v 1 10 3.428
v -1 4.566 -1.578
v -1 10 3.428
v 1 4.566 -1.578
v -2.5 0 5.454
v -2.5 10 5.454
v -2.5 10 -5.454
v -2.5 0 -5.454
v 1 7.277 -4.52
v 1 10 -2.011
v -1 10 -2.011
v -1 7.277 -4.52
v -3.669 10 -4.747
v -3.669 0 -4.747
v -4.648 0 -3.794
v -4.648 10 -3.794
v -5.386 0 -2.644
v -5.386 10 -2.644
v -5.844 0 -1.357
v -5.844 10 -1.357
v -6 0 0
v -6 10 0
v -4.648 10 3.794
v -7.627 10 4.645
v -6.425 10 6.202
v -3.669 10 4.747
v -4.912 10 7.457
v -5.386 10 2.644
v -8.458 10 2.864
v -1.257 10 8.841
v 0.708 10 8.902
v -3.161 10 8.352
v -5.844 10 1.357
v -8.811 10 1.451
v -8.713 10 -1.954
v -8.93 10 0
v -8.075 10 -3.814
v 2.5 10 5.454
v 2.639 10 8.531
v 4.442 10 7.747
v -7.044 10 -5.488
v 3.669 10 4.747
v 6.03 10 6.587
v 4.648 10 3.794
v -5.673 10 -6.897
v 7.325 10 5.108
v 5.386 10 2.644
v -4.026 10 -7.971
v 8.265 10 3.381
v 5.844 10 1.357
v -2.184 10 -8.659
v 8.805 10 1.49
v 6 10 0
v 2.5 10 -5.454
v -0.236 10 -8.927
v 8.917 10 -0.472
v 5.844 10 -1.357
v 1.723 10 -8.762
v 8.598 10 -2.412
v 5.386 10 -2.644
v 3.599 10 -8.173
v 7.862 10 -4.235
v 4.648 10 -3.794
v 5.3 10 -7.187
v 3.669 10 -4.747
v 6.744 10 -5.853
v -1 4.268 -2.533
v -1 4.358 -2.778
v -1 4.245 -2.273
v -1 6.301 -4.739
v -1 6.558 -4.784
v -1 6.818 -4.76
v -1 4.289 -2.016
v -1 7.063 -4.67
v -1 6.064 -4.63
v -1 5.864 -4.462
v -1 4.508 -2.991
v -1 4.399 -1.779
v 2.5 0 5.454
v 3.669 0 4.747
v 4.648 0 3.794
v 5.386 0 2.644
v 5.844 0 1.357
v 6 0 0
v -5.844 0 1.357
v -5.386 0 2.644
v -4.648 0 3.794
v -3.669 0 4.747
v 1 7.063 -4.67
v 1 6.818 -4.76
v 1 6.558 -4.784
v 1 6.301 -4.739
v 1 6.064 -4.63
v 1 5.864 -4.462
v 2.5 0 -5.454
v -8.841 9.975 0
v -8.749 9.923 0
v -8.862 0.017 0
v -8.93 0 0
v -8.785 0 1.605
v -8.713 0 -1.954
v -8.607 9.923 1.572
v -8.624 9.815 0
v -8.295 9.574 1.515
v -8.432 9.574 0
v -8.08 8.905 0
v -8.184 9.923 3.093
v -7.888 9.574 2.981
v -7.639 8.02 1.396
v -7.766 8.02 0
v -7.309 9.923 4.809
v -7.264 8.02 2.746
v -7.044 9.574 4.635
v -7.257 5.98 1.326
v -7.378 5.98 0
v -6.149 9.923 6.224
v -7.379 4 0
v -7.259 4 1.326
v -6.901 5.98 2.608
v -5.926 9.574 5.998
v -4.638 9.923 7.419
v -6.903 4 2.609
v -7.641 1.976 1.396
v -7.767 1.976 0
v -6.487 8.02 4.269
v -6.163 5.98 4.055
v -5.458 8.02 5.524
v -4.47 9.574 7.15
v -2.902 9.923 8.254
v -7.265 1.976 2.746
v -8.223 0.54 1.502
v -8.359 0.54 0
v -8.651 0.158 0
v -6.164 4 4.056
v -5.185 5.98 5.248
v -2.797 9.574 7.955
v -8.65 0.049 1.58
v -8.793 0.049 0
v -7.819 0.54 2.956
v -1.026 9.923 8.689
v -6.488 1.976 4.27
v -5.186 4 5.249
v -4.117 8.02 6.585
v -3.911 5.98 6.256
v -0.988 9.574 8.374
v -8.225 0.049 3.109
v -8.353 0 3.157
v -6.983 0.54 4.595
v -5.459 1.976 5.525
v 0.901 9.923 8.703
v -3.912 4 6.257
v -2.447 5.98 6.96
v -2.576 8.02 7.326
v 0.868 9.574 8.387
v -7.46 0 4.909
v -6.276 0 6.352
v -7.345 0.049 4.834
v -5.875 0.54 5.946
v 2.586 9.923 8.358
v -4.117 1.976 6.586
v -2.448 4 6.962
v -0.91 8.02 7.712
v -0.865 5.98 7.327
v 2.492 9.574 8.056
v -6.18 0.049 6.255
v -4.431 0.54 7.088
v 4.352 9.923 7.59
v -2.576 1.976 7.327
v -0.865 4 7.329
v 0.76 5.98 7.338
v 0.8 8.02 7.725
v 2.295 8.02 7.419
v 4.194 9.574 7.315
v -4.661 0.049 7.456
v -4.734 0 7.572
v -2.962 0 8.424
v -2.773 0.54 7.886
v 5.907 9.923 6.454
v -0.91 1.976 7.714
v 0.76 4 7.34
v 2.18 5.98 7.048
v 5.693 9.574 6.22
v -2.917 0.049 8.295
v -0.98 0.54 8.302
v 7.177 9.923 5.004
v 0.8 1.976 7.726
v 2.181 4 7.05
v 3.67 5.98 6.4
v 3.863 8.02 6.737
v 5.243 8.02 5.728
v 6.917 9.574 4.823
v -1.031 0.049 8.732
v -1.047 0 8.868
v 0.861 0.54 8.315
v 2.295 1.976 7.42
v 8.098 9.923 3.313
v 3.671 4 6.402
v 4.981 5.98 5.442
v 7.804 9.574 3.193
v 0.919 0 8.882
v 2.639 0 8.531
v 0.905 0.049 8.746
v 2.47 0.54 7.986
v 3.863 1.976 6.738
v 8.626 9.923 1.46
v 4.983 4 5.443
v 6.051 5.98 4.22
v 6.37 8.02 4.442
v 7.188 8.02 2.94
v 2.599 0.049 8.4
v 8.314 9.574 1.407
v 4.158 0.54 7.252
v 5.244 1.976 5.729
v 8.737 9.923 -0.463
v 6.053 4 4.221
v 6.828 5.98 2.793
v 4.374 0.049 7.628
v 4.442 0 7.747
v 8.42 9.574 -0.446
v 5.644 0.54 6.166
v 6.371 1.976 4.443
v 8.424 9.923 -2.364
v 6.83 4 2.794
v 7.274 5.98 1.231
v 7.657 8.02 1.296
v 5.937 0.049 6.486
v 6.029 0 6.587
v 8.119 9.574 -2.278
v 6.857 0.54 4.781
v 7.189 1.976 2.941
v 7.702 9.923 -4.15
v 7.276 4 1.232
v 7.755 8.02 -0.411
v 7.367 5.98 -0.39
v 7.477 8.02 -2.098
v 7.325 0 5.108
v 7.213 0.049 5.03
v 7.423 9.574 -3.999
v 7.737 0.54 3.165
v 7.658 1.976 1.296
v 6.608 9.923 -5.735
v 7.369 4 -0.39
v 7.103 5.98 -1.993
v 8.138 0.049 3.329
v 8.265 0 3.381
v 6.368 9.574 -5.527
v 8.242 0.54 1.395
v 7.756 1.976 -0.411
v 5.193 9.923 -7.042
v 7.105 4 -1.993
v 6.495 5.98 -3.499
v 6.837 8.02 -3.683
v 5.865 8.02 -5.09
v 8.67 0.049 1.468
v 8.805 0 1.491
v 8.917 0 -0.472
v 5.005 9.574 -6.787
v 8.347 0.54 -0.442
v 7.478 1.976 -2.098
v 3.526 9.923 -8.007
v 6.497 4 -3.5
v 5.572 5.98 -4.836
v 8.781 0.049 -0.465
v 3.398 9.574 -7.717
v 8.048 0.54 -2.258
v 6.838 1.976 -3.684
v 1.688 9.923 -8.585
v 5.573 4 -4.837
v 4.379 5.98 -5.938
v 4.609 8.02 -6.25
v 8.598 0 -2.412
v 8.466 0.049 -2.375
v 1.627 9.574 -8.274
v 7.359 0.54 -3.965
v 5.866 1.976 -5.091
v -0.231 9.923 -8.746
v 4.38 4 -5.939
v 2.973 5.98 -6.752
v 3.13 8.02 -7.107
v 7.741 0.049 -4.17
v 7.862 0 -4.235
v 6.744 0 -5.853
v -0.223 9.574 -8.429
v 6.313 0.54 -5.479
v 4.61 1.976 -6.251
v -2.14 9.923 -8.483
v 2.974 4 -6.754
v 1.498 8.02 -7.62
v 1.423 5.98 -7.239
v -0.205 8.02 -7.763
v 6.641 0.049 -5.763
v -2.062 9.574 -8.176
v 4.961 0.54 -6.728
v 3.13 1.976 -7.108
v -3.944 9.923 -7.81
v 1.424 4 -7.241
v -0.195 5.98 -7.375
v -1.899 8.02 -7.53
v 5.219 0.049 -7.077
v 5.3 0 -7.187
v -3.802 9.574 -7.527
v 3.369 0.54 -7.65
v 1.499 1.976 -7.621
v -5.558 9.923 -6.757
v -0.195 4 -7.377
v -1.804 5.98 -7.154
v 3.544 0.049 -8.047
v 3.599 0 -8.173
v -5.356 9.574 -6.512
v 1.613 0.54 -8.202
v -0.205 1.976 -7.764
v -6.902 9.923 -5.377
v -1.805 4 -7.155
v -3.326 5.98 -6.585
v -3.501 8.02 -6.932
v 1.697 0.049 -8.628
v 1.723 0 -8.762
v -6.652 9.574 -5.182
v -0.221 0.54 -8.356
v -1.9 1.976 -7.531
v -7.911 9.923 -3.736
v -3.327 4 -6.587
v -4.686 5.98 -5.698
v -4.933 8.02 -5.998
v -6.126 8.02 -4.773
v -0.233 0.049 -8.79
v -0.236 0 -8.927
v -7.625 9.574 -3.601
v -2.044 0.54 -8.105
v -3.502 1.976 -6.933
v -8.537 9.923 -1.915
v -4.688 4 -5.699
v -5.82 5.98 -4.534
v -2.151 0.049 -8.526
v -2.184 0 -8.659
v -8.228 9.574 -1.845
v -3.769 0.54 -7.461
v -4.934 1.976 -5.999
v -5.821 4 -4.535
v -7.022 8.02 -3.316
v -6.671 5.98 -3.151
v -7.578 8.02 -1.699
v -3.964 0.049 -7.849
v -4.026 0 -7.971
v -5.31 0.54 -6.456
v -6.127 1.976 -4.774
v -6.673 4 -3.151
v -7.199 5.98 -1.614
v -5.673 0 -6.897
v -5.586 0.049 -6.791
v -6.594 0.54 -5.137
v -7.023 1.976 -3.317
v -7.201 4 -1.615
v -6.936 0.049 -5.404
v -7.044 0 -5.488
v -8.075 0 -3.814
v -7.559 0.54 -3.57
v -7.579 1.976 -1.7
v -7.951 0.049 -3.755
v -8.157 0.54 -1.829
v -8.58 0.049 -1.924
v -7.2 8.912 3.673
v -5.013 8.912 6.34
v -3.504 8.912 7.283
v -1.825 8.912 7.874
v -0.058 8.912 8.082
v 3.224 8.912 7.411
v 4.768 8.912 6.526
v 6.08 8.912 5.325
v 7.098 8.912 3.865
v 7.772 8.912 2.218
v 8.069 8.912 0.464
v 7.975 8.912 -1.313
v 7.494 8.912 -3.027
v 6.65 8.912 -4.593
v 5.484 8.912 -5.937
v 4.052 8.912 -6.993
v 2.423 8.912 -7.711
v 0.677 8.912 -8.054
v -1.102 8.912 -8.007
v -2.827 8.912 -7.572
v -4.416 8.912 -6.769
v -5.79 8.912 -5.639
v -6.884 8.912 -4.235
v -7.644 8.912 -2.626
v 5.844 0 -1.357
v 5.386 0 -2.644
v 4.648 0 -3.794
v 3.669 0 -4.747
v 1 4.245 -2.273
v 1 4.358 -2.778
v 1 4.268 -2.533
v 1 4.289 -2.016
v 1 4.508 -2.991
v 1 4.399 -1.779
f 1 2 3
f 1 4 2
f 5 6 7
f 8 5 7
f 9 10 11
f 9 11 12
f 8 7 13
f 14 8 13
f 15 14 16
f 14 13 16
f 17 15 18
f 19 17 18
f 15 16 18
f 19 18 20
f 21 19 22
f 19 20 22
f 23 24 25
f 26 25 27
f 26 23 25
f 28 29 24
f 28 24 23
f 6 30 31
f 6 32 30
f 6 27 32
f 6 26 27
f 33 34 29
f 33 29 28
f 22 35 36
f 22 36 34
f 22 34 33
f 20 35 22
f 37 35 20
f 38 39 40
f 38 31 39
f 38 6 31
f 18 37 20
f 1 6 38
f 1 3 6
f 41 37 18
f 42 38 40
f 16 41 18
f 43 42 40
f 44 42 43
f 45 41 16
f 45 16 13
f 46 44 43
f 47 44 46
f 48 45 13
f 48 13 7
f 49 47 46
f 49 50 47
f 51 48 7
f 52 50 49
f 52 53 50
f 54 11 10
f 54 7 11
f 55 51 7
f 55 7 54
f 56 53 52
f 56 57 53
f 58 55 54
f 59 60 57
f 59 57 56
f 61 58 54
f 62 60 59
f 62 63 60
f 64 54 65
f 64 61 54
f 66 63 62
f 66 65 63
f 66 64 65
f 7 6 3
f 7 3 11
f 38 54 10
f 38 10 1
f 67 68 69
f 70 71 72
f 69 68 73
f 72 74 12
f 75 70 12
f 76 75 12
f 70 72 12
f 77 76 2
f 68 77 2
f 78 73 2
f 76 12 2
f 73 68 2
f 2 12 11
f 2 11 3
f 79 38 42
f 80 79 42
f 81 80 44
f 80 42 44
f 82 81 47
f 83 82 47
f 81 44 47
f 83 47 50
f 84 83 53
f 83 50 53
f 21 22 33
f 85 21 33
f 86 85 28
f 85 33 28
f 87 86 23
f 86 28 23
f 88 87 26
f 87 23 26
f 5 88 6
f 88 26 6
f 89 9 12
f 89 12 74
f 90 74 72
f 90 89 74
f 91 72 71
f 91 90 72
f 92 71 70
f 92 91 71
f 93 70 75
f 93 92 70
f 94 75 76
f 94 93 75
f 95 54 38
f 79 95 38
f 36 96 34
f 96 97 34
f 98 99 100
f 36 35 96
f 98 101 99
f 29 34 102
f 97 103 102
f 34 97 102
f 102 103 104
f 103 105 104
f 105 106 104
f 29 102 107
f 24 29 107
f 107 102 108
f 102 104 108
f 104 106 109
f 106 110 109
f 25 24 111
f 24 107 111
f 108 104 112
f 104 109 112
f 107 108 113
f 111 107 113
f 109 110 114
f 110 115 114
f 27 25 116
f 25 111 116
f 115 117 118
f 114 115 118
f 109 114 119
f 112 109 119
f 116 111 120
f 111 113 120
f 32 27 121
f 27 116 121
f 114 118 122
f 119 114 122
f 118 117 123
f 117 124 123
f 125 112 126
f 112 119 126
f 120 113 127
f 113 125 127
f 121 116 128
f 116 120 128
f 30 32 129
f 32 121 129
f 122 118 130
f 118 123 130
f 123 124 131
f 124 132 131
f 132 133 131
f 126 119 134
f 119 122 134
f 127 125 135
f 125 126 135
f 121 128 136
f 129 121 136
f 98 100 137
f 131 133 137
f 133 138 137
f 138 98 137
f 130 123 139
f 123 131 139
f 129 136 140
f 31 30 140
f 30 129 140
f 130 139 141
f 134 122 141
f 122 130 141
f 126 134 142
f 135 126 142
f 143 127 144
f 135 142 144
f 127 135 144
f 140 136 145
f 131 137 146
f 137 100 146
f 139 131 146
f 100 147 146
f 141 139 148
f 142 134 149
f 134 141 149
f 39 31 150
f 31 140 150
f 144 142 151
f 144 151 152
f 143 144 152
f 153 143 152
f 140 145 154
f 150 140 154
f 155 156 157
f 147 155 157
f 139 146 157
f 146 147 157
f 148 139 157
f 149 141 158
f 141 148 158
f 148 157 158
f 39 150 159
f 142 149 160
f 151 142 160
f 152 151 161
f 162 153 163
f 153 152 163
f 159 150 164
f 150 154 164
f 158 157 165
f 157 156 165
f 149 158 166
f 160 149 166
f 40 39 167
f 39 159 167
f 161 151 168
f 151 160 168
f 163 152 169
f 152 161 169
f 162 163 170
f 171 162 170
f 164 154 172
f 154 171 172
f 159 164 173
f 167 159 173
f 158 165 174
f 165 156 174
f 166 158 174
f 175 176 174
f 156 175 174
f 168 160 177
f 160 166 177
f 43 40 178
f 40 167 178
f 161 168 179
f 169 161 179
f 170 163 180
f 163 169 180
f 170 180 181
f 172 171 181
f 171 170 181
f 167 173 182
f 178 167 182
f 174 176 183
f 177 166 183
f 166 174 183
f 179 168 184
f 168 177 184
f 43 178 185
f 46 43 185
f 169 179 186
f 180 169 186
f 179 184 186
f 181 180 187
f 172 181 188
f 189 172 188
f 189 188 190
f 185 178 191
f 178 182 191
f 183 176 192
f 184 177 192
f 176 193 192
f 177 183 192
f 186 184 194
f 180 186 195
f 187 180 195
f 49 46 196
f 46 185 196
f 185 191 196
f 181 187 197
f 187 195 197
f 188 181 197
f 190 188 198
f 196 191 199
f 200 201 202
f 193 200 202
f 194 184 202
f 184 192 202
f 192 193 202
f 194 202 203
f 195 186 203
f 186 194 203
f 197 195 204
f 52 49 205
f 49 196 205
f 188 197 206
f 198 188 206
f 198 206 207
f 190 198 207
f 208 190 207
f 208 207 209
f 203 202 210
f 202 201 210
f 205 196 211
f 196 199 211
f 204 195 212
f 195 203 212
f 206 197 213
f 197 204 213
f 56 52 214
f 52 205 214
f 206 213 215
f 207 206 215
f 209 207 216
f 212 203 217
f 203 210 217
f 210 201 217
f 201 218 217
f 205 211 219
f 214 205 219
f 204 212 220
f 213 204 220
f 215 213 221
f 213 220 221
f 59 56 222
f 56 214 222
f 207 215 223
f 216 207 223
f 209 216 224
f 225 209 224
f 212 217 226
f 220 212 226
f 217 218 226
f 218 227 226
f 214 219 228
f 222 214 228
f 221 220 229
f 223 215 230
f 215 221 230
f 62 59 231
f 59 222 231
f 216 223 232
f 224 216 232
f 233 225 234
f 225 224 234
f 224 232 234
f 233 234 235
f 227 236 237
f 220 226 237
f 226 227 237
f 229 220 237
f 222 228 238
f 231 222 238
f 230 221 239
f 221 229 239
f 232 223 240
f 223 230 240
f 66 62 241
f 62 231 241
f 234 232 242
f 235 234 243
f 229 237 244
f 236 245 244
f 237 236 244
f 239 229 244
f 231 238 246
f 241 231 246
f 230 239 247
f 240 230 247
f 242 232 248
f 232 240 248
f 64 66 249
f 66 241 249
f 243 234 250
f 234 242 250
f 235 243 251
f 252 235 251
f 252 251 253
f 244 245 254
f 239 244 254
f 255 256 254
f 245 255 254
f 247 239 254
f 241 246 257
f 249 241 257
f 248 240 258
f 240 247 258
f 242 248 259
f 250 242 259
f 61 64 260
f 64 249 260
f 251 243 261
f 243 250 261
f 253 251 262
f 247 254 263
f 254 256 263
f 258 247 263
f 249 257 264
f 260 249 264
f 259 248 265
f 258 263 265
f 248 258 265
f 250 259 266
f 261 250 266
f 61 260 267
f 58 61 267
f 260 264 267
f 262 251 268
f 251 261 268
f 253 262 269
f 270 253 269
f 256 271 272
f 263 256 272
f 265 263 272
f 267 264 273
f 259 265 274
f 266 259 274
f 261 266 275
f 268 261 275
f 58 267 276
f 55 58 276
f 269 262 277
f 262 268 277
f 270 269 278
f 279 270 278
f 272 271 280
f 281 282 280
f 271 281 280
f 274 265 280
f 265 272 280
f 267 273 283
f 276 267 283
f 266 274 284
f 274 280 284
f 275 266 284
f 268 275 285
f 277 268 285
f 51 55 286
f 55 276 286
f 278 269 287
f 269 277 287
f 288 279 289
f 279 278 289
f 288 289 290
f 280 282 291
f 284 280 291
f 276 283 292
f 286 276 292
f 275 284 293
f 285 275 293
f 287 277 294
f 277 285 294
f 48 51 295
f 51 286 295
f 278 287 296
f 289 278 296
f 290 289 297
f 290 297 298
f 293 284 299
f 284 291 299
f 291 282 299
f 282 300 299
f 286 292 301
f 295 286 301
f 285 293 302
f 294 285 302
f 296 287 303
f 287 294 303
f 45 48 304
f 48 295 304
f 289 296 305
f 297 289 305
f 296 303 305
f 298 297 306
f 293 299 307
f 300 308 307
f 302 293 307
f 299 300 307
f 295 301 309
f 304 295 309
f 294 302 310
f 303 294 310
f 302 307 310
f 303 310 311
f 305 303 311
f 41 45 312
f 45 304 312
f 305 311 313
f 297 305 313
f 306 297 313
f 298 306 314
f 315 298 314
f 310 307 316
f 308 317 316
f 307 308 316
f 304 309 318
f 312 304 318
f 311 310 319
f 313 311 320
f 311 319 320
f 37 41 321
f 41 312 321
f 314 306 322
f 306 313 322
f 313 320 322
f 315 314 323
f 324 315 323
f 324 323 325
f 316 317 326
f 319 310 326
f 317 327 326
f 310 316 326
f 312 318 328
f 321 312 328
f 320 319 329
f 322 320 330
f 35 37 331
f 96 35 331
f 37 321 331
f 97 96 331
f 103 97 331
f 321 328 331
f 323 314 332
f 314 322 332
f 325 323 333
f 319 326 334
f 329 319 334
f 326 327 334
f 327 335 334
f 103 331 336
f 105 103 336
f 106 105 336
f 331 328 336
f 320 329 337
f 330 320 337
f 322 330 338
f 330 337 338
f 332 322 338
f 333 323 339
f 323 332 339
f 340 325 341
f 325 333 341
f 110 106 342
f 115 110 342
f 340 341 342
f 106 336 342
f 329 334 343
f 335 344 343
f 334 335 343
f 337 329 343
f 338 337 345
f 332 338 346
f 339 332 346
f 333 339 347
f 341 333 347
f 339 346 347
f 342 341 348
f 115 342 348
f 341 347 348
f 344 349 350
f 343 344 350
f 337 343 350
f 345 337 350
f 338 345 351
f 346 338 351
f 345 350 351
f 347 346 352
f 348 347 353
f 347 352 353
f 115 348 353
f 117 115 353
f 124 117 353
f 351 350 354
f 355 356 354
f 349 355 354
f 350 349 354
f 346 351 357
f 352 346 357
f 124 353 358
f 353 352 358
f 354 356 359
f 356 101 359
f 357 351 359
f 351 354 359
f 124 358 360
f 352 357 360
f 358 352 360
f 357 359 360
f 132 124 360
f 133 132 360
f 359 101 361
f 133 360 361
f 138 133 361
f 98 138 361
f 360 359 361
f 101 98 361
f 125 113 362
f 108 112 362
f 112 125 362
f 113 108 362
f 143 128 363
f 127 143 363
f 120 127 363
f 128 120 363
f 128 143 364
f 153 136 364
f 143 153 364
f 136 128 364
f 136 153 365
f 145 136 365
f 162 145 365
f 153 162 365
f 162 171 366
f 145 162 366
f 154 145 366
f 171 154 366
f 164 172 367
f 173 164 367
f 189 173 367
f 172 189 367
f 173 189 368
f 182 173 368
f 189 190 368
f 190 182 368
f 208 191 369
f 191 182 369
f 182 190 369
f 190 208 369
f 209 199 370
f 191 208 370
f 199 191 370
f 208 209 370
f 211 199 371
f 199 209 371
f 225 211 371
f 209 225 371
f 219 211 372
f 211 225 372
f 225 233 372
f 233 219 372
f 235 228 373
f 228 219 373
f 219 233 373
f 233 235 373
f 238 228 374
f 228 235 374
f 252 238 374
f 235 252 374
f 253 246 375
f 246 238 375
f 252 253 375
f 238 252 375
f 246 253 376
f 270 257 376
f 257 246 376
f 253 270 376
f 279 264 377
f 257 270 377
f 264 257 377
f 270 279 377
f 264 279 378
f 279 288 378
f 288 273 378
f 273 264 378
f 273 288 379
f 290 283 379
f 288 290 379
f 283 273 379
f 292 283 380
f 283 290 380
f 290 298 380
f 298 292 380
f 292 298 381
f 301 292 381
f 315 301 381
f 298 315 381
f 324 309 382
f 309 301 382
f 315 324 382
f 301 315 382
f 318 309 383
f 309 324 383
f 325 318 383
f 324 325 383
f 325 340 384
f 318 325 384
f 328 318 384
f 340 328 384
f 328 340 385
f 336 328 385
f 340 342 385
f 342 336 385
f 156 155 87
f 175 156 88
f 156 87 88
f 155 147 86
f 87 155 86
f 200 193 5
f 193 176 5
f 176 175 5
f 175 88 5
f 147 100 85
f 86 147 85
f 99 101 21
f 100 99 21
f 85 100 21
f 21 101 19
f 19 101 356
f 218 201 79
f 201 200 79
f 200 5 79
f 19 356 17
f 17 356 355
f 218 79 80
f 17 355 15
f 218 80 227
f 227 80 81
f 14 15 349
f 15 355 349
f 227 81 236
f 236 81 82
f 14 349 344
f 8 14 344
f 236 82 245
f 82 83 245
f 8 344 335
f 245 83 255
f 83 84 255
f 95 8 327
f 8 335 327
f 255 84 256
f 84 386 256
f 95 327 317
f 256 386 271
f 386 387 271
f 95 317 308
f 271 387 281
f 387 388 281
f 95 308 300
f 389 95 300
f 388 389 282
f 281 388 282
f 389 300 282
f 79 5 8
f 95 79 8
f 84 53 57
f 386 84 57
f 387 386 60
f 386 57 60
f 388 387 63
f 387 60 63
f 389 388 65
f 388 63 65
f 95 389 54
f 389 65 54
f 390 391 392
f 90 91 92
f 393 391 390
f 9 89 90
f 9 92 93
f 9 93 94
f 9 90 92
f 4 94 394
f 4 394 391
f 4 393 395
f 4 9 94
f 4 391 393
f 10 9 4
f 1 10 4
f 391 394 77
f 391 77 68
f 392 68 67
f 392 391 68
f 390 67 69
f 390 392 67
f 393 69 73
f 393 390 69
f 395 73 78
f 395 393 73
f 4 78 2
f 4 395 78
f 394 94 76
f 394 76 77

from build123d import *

# Parameters (mm, degrees)
SKETCH2_R               = 9
BOSS_EXTRUDE1_DEPTH     = 10
CUT_EXTRUDE1_DEPTH      = 11.0000001
CUT_EXTRUDE2_DEPTH      = 1
CUT_EXTRUDE2_DEPTH_BACK = 1


with BuildPart() as part:
    # Sketch2 → Boss-Extrude1 (new body)
    with BuildSketch(Plane(origin=(0, 0, 0), x_dir=(1, 0, 0), z_dir=(0, 1, 0))):
        Circle(SKETCH2_R)
    extrude(amount=BOSS_EXTRUDE1_DEPTH)

    # Sketch3 → Cut-Revolve1 (revolve, cut)
    with BuildSketch(Plane.XY):
        with BuildLine():
            Line((-9, 10), (-9, 0))
            add(Edge.make_bspline(
                [(-9, 10), (-8.339177008, 10.090505936), (-6.320822992, 5), (-8.339177008, -0.090505936), (-9, 0)],
                knots=[0, 0, 0, 0, 0.256608512, 0.513217025, 0.513217025, 0.513217025, 0.513217025], degree=3))
        make_face()
    revolve(axis=Axis((0, 0, 0), (0, 1, 0)), mode=Mode.SUBTRACT)

    # Sketch4 → Cut-Extrude1 (cut, through all)
    with BuildSketch(Plane(origin=(0, 10, 0), x_dir=(1, 0, 0), z_dir=(0, 1, 0))):
        with BuildLine():
            ThreePointArc((-6, 0), (-5.049752469, -3.240370349), (-2.5, -5.454356057))
            Line((-2.5, -5.454356057), (-2.5, 0))
            Line((-2.5, 0), (-6, 0))
        make_face()
        with BuildLine():
            Line((-6, 0), (-2.5, 0))
            Line((-2.5, 0), (-2.5, 5.454356057))
            ThreePointArc((-2.5, 5.454356057), (-5.049752469, 3.240370349), (-6, 0))
        make_face()
        with BuildLine():
            Line((2.5, 0), (2.5, -5.454356057))
            ThreePointArc((2.5, -5.454356057), (5.049752469, -3.240370349), (6, 0))
            Line((6, 0), (2.5, 0))
        make_face()
        with BuildLine():
            Line((2.5, 5.454356057), (2.5, 0))
            Line((2.5, 0), (6, 0))
            ThreePointArc((6, 0), (5.049752469, 3.240370349), (2.5, 5.454356057))
        make_face()
    extrude(amount=-CUT_EXTRUDE1_DEPTH, mode=Mode.SUBTRACT)

    # Sketch5 → Cut-Extrude2 (cut, two sides)
    with BuildSketch(Plane.ZY) as cut_extrude2_sk:
        with BuildLine():
            Line((-2.01113744, 10), (-4.520166387, 7.276604619))
            ThreePointArc((-4.520166387, 7.276604619), (-4.783869038, 6.55810107), (-4.462276239, 5.863576406))
            Line((-4.462276239, 5.863576406), (-2.991357878, 4.508438341))
            ThreePointArc((-2.991357878, 4.508438341), (-2.272854329, 4.24473569), (-1.578329665, 4.566328489))
            Line((-1.578329665, 4.566328489), (3.427641633, 10))
            Line((3.427641633, 10), (-2.01113744, 10))
        make_face()
    extrude(amount=CUT_EXTRUDE2_DEPTH, mode=Mode.SUBTRACT)
    extrude(cut_extrude2_sk.sketch, amount=-CUT_EXTRUDE2_DEPTH_BACK, mode=Mode.SUBTRACT)


solid = part.part
